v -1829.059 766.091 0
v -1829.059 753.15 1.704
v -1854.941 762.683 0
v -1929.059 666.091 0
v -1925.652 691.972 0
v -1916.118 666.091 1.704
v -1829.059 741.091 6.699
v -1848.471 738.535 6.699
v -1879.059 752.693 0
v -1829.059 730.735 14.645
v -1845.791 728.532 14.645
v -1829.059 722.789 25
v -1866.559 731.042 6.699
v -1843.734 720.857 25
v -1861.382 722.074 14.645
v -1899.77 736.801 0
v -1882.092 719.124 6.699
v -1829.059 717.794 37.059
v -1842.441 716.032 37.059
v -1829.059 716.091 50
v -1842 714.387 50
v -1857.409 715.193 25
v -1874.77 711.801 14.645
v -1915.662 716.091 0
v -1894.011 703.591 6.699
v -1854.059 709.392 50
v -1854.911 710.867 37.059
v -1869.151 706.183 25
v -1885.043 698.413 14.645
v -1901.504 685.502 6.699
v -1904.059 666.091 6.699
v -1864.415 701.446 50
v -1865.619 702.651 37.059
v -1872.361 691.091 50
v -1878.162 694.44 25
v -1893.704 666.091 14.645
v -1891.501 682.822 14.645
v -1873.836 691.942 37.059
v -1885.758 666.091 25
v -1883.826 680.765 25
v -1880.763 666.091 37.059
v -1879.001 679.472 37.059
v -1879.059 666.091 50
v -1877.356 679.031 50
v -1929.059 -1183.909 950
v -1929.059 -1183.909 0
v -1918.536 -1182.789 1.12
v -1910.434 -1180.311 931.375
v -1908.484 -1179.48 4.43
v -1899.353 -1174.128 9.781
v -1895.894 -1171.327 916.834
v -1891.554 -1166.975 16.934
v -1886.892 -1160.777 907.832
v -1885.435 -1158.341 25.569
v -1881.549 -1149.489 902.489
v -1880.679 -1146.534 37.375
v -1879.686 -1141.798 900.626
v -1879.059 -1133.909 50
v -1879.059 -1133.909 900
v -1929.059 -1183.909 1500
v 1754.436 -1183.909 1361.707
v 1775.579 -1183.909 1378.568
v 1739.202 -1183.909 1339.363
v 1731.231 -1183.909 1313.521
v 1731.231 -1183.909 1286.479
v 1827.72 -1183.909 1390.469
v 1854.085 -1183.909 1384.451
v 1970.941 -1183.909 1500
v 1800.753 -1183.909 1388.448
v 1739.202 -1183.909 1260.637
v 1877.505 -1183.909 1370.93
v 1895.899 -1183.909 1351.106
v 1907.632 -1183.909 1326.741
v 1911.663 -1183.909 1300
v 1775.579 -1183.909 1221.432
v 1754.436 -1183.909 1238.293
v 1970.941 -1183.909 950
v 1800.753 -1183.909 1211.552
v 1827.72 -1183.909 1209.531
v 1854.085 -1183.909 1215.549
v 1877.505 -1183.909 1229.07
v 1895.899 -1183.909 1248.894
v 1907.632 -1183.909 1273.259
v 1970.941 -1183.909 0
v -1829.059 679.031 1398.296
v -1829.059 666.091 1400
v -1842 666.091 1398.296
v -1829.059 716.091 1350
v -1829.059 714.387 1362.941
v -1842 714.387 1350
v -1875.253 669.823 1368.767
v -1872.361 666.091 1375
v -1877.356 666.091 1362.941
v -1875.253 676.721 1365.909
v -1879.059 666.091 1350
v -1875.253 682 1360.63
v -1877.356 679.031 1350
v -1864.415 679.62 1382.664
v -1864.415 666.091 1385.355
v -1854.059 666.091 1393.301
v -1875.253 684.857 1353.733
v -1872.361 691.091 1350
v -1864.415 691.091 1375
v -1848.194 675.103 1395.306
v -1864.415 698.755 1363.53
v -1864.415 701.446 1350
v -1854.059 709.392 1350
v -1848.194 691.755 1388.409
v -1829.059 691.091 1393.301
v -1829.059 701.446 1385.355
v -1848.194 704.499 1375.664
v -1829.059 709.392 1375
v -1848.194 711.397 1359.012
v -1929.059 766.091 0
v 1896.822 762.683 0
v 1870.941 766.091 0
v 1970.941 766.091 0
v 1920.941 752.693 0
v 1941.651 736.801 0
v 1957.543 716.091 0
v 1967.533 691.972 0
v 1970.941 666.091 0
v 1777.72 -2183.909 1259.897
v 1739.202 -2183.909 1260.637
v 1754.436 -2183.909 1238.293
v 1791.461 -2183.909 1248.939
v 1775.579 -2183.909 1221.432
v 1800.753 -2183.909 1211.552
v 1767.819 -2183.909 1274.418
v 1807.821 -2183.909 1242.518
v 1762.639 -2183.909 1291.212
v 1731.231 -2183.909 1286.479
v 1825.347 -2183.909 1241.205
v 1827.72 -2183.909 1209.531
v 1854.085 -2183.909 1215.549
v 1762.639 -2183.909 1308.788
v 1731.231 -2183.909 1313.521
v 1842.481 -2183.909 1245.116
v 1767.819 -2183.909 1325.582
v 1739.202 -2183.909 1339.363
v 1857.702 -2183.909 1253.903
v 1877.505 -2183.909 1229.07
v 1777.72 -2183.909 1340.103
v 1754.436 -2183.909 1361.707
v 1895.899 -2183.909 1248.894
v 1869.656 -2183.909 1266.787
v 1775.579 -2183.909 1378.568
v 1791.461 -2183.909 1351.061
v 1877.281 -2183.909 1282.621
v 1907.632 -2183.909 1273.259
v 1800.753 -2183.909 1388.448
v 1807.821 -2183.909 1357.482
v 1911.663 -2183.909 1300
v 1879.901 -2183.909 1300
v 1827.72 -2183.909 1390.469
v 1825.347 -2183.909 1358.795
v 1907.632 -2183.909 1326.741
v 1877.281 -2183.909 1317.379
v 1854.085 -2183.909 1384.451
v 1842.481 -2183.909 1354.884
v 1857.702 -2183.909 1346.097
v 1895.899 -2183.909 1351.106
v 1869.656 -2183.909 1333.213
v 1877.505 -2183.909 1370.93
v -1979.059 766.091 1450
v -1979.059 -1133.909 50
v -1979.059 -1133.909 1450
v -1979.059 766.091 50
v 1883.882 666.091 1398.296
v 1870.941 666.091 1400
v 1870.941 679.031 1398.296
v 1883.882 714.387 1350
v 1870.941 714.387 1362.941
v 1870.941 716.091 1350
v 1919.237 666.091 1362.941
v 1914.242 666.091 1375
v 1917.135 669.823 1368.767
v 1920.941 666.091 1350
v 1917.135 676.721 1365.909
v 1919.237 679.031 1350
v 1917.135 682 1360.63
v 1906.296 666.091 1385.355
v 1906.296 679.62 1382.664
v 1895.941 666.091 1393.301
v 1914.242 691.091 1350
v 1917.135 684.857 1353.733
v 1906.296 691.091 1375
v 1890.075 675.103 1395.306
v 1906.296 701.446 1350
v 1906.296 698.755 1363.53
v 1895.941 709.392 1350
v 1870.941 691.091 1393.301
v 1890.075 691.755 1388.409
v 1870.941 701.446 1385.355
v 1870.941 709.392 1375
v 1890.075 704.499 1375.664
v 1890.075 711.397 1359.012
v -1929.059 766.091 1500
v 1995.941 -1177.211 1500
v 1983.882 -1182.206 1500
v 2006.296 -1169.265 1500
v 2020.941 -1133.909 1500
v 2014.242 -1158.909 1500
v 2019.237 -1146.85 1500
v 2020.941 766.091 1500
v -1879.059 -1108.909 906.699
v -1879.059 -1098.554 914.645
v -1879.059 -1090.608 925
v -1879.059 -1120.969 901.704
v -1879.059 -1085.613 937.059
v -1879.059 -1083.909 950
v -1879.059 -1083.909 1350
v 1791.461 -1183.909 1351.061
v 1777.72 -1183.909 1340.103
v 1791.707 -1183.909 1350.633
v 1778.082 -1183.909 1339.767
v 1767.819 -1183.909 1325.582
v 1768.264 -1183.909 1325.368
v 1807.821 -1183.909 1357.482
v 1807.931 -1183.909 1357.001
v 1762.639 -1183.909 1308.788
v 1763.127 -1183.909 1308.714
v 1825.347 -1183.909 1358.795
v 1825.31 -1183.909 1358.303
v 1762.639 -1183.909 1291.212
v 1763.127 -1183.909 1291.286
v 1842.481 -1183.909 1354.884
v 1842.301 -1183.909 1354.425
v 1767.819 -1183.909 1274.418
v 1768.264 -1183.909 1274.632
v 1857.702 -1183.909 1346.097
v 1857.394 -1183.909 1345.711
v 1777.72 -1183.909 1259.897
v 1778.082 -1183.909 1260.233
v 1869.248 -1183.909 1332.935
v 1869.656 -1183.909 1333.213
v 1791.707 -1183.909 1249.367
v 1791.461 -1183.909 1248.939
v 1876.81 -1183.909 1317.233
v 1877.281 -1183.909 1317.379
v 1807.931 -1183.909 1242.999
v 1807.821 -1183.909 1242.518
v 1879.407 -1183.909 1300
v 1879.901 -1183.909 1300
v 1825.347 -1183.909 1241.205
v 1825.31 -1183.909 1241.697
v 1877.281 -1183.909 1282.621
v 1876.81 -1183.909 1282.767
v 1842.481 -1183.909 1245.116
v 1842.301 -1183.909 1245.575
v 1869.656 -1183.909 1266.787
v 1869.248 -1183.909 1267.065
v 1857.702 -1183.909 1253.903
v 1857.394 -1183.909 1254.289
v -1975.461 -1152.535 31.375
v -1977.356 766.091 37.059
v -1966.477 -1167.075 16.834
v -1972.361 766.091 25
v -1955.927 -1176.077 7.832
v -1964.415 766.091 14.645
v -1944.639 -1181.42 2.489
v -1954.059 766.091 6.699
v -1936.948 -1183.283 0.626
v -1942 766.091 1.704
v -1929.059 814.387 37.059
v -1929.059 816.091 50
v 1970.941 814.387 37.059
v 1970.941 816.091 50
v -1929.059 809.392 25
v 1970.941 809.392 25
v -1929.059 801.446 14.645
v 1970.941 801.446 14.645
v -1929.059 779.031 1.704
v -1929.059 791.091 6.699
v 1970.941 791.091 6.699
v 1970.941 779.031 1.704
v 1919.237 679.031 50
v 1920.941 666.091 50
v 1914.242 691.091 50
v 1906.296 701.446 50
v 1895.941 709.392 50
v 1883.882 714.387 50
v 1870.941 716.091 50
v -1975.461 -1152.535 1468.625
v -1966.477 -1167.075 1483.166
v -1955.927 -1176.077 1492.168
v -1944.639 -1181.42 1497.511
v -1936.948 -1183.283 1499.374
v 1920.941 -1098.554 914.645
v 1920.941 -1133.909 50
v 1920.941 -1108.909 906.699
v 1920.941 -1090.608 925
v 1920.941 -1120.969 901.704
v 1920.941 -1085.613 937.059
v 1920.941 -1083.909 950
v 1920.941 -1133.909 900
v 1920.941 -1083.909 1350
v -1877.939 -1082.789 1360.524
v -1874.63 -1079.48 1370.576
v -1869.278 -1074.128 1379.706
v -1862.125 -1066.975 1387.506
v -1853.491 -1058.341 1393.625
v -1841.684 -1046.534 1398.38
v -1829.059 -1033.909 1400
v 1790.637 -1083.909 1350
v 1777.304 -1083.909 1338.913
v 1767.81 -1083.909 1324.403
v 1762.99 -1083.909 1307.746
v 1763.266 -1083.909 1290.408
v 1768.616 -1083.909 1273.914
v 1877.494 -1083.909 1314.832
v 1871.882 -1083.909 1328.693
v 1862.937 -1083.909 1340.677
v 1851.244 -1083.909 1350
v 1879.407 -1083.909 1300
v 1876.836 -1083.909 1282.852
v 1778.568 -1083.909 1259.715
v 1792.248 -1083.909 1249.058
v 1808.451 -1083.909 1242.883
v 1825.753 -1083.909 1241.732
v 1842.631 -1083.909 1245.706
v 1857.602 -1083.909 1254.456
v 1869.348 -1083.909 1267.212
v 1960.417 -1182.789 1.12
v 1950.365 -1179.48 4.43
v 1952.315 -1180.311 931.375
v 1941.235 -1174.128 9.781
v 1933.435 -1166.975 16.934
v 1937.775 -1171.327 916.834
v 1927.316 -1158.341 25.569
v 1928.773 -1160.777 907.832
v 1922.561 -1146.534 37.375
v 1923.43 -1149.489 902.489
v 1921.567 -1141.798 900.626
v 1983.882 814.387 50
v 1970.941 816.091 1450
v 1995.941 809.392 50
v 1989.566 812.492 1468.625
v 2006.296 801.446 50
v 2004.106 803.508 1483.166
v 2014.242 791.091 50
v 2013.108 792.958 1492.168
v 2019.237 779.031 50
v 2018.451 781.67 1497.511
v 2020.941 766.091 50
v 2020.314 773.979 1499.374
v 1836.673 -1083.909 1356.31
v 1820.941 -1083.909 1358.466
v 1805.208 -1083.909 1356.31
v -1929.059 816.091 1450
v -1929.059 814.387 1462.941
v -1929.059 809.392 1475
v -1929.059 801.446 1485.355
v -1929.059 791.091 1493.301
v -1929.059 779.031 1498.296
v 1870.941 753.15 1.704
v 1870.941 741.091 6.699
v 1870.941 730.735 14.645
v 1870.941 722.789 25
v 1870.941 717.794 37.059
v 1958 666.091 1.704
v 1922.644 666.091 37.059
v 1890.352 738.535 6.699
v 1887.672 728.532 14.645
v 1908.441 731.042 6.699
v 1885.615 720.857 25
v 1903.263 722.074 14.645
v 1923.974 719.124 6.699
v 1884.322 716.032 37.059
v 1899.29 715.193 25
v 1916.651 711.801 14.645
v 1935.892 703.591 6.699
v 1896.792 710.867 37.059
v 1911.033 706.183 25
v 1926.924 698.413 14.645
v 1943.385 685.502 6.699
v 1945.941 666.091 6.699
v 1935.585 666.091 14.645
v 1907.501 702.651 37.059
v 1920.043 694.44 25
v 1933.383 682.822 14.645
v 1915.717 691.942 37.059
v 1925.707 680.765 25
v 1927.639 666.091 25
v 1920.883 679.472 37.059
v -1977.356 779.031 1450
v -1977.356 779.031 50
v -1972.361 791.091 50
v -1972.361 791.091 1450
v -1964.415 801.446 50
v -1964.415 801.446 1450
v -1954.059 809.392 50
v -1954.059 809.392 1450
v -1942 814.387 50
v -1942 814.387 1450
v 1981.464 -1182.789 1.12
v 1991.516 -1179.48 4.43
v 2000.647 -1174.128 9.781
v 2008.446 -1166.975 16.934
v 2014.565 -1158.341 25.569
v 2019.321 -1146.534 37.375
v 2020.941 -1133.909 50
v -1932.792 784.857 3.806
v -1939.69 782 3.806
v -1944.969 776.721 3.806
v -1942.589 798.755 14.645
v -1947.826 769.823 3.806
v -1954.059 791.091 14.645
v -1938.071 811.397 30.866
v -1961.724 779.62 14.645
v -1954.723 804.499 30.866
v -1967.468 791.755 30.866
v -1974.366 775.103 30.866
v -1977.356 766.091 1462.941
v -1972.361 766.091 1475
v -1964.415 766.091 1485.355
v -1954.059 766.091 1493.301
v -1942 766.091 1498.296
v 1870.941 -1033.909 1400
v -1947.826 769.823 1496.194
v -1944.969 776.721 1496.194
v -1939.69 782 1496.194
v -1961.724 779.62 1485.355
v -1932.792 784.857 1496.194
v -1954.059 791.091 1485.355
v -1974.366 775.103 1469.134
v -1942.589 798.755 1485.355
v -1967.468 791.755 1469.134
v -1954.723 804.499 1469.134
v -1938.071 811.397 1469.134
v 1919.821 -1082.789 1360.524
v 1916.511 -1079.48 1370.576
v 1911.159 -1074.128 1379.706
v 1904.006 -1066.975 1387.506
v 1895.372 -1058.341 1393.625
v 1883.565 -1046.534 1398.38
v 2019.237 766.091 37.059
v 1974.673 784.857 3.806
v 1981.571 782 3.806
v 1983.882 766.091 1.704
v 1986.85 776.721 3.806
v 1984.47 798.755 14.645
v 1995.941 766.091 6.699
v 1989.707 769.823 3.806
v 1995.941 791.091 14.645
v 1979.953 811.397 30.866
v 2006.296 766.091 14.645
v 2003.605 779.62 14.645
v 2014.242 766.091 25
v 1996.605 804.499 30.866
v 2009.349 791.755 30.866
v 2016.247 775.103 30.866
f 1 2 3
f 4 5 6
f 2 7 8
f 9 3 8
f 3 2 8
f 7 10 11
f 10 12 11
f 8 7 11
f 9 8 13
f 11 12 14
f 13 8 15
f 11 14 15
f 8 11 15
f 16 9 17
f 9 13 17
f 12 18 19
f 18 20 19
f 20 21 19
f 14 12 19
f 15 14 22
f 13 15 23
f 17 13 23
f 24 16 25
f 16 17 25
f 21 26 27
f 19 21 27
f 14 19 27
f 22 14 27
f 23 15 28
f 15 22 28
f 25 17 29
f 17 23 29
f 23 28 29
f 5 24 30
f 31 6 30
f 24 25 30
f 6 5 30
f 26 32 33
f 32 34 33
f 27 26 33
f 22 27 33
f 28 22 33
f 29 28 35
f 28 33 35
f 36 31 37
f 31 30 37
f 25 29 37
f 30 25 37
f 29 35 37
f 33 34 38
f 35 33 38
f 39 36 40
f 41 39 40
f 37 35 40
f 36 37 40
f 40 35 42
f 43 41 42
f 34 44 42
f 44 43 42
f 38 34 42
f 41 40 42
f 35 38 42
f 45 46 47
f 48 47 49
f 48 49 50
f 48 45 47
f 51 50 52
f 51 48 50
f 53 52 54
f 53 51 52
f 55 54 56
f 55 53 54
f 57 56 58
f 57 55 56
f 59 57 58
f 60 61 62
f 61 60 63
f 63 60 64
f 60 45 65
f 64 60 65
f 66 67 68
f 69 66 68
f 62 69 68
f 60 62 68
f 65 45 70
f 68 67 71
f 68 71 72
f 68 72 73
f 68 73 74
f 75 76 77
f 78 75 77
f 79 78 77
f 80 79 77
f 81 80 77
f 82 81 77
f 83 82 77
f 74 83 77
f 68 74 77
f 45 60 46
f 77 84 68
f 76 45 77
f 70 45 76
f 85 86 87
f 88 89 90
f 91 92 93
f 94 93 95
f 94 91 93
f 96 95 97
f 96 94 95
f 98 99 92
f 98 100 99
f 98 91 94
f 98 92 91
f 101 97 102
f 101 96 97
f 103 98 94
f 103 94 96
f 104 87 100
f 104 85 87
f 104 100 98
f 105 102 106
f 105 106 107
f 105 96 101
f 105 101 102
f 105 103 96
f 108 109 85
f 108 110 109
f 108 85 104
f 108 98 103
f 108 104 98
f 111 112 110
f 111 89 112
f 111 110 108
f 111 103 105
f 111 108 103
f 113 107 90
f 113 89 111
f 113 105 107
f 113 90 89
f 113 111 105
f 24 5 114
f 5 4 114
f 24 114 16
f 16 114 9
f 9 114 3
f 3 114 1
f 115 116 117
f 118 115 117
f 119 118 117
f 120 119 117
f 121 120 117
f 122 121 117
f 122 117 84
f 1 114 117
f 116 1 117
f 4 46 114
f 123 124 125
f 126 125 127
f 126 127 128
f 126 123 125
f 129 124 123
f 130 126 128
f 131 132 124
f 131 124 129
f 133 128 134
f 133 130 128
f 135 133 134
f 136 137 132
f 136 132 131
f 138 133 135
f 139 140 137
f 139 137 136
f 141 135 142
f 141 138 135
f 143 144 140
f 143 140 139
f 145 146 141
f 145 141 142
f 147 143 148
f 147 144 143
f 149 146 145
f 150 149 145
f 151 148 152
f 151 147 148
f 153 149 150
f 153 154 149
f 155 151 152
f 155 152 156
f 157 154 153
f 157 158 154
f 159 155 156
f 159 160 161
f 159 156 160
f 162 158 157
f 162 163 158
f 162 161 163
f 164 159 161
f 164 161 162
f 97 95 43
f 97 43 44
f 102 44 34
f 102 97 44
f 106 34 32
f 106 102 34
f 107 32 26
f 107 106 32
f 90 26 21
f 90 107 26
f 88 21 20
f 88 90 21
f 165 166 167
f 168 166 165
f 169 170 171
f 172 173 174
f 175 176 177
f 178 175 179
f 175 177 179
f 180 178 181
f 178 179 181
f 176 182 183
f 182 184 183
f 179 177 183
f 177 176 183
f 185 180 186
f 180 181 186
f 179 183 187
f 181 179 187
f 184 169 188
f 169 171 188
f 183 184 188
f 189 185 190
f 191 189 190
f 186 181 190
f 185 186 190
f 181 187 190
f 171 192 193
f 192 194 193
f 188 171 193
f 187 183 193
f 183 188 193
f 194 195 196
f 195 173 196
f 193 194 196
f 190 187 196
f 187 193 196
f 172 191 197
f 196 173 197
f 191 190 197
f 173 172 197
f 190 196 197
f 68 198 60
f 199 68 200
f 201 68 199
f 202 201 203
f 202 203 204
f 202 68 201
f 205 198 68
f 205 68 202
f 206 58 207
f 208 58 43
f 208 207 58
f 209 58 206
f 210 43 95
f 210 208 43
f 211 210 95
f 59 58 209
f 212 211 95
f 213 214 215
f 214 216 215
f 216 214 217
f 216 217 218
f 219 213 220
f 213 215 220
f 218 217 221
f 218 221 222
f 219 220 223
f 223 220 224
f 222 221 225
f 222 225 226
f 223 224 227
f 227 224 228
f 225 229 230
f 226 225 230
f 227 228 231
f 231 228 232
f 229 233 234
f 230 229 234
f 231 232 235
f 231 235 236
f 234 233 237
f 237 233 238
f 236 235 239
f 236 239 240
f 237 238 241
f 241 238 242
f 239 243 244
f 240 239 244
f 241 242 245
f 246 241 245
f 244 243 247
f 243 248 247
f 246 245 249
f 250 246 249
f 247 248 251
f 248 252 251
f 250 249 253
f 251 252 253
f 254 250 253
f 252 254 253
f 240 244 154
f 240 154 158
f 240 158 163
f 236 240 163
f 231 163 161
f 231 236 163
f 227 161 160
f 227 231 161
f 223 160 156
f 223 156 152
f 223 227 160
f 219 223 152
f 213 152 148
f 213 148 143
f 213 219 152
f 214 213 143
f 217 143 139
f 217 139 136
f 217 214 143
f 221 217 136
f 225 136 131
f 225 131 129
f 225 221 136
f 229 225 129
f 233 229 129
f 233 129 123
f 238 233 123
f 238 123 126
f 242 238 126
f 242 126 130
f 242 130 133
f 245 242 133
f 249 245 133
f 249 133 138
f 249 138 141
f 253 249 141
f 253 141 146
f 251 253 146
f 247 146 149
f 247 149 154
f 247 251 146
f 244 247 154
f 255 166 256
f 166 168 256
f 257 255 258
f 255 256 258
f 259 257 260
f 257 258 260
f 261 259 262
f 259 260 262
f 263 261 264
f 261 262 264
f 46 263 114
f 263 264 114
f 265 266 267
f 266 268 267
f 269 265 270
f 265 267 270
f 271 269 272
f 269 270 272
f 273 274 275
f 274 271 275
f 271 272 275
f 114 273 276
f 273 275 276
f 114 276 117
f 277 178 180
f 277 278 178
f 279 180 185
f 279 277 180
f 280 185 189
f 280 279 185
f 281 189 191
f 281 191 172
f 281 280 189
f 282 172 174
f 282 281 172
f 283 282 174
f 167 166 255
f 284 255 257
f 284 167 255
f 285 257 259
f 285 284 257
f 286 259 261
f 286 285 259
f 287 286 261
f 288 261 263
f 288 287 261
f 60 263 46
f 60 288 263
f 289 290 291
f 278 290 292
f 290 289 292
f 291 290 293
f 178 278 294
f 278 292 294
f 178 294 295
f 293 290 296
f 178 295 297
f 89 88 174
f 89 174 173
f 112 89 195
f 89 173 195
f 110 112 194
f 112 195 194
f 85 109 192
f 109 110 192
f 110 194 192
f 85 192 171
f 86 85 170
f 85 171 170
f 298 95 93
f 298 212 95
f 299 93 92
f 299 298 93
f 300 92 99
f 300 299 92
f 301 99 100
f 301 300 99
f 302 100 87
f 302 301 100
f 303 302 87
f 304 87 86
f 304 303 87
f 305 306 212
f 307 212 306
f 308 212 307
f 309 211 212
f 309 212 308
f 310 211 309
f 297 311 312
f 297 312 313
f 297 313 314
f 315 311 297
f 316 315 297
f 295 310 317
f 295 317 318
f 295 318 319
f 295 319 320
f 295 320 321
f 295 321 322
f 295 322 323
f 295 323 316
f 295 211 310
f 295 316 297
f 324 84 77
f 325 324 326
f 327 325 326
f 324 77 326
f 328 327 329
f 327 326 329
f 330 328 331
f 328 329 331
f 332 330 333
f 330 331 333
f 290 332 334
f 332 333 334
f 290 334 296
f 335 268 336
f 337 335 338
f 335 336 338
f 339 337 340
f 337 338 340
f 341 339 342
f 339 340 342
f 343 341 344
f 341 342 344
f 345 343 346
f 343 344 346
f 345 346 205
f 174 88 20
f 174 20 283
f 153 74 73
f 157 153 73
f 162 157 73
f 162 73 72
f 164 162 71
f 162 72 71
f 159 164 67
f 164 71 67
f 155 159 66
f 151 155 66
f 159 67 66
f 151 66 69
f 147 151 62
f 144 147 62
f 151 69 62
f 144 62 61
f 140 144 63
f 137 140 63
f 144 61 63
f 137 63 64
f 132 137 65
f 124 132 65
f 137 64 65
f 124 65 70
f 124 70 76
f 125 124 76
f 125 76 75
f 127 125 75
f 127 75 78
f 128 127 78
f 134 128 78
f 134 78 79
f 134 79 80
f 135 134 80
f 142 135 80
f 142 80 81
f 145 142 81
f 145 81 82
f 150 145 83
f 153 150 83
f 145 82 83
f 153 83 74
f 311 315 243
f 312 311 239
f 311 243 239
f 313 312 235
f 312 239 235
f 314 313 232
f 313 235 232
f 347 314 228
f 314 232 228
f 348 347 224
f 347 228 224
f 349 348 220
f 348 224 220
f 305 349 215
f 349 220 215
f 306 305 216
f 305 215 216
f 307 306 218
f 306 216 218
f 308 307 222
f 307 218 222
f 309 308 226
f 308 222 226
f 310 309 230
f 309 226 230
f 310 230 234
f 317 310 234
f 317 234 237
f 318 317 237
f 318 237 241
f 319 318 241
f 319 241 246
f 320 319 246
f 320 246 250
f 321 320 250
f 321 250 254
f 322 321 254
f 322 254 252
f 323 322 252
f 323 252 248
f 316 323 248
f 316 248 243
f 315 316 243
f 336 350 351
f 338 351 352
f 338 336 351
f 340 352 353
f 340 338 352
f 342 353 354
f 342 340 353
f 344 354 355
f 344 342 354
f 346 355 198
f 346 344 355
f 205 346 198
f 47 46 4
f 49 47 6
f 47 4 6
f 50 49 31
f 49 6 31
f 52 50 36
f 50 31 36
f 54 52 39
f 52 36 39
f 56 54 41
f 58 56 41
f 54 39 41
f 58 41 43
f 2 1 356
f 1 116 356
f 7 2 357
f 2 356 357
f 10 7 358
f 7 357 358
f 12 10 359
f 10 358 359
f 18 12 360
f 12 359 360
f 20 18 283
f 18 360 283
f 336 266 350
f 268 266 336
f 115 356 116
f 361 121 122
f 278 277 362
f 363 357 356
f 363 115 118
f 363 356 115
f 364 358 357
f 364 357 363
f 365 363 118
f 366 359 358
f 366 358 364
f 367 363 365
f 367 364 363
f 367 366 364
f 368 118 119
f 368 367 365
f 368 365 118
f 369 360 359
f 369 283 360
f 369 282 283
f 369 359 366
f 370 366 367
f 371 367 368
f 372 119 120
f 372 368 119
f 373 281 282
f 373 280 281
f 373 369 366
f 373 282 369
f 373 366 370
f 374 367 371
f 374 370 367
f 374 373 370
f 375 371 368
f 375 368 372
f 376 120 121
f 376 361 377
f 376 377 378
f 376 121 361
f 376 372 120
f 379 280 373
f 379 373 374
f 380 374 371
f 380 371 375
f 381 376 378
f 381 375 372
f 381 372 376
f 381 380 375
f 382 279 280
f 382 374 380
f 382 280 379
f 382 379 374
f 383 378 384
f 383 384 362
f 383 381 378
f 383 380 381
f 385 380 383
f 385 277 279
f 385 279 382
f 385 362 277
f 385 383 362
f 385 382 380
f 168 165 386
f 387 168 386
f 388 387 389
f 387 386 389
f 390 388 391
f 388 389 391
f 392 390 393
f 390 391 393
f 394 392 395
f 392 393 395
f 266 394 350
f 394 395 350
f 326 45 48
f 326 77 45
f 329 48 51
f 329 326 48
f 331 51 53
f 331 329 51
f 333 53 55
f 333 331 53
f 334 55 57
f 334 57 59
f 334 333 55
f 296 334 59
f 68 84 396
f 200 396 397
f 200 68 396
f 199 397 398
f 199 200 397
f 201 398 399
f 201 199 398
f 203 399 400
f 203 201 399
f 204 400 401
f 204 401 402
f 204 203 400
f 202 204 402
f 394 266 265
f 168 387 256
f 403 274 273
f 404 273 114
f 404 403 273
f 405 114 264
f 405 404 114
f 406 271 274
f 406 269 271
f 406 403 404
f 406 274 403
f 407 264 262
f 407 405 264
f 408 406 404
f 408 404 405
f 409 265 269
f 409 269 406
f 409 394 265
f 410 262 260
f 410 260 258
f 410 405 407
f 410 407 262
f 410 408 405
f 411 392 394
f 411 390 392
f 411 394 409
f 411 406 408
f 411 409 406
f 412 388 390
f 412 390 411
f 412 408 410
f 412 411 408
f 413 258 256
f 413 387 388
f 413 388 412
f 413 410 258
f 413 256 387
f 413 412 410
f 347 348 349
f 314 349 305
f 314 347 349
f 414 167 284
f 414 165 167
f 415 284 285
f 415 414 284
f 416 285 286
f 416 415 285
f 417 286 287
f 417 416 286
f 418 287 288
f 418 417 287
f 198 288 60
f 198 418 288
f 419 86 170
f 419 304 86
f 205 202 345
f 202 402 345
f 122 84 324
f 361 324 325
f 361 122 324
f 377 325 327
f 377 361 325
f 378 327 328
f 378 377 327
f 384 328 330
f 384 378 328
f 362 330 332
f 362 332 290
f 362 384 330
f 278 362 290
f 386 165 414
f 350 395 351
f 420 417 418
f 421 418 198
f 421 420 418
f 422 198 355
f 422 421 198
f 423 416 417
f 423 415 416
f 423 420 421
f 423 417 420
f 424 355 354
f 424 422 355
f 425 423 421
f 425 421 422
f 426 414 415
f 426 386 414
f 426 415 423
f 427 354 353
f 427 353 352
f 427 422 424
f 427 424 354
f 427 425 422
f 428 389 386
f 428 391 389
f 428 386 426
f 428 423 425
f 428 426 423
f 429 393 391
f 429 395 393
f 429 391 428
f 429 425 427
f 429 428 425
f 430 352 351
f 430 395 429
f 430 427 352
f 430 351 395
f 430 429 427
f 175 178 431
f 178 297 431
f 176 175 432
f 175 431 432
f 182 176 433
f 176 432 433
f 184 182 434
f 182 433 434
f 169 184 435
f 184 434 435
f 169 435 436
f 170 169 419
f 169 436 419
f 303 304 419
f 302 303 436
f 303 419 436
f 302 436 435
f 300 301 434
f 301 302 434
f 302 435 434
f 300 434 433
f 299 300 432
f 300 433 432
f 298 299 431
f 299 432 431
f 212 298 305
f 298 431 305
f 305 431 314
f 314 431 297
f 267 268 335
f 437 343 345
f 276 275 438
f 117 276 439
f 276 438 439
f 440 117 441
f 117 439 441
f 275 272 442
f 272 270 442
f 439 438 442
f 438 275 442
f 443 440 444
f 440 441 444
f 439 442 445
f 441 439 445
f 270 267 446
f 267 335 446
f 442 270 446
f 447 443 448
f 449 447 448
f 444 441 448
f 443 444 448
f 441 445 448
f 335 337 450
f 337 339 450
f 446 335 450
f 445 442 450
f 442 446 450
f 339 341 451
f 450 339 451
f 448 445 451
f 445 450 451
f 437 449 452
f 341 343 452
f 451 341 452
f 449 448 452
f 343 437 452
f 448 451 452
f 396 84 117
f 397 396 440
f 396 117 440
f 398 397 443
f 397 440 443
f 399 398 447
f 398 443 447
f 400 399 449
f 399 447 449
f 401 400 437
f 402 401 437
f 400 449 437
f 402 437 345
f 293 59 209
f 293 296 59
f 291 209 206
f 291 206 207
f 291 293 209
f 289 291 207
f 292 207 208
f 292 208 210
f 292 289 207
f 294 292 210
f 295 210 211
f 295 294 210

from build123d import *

# Parameters (mm, degrees)
F0_W      = 4000
F0_H      = 2000
F1_DEPTH  = 1500
F2_W      = 3800
F2_H      = 900
F3_DEPTH  = 1900
F4_W      = 3800
F4_H      = 1800
F5_DEPTH  = 500
F6_R      = 90.7224543957
F6_R_2    = 58.9600889745
F7_DEPTH  = 1000
F8_R      = 49.99999
F9_R      = 58.4664374667
F10_DEPTH = 100


# Not quite as in the source:
# - a fillet or chamfer is up to 0.001 mm smaller than in the source, because OpenCascade refuses the exact size


with BuildPart() as f1:
    # F0 (on Top) → F1 (new body)
    with BuildSketch(Plane.XY):
        with Locations((20.9405645728, -183.9094895178)):
            Rectangle(F0_W, F0_H)
    extrude(amount=F1_DEPTH)

    # F2 (on face) → F3 (cut)
    with BuildSketch(Plane.XZ.offset(1183.9094895178)):
        with Locations((20.9405645728, 450)):
            Rectangle(F2_W, F2_H)
    extrude(amount=-F3_DEPTH, mode=Mode.SUBTRACT)

    # F4 (on face) → F5 (cut)
    with BuildSketch(Plane(origin=(0, 0, 900), x_dir=(1, 0, 0), z_dir=(0, 0, -1))):
        with Locations((20.9405645728, 183.9094895178)):
            Rectangle(F4_W, F4_H)
    extrude(amount=-F5_DEPTH, mode=Mode.SUBTRACT)

    # F6 (on face) → F7 (join)
    with BuildSketch(Plane.XZ.offset(1183.9094895178)):
        with Locations((1820.9405645728, 1300)):
            Circle(F6_R)
        with Locations((1820.9405645728, 1300)):
            Circle(F6_R_2, mode=Mode.SUBTRACT)
    extrude(amount=F7_DEPTH)

    # F8 (radius 50 in the source; OpenCascade refuses exactly that, so slightly less here)
    f8_edges = [f1.edges().sort_by_distance(p)[0] for p in [
        (20.940565, -1183.90949, 900),
        (-1979.059435, -1183.90949, 750),
        (2020.940565, -1183.90949, 750),
        (2020.940565, 816.09051, 750),
        (-1979.059435, 816.09051, 750),
        (20.940565, -1083.90949, 900),
        (20.940565, 816.09051, 0),
        (-1979.059435, -183.90949, 0),
        (-1979.059435, -183.90949, 1500),
        (-1879.059435, -233.90949, 0),
        (1920.940565, -233.90949, 0),
        (2020.940565, -183.90949, 0),
        (1920.940565, -1183.90949, 450),
        (-1879.059435, -1183.90949, 450),
        (20.940565, 716.09051, 1400),
        (-1879.059435, -183.90949, 1400),
        (1920.940565, -183.90949, 1400),
        (20.940565, -1083.90949, 1400),
        (20.940565, 816.09051, 1500),
        (1920.940565, 716.09051, 700),
        (-1879.059435, 716.09051, 700),
        (20.940565, 716.09051, 0),
    ]]
    fillet(f8_edges, radius=F8_R)

    # F9 (on face) → F10 (cut)
    with BuildSketch(Plane.XZ.offset(1183.9094895178)):
        with Locations((1820.9405645728, 1300)):
            Circle(F9_R)
    extrude(amount=-F10_DEPTH, mode=Mode.SUBTRACT)


solid = f1.part
